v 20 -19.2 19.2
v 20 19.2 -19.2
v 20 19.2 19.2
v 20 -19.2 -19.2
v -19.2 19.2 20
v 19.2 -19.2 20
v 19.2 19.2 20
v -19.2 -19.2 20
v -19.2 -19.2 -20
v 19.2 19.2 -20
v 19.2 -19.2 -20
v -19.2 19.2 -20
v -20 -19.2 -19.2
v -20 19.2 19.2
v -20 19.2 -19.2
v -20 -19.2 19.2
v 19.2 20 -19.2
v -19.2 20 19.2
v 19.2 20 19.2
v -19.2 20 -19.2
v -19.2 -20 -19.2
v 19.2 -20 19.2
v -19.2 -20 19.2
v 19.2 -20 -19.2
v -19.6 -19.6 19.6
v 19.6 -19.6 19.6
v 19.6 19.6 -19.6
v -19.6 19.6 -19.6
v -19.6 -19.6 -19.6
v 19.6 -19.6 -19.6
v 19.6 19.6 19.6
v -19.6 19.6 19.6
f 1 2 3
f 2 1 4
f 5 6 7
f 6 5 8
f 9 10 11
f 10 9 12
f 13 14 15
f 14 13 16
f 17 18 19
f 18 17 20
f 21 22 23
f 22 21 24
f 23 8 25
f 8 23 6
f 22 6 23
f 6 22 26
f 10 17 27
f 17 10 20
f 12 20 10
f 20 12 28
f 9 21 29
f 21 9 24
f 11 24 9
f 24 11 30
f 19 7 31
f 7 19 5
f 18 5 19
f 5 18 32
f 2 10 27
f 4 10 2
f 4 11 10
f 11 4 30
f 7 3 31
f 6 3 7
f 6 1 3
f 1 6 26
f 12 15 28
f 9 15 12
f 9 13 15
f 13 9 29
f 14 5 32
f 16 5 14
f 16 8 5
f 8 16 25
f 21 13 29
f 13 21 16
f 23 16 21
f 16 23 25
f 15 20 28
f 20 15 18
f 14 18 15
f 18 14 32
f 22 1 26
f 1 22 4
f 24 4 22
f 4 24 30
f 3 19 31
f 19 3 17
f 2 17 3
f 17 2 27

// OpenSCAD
// file: tag_bits.scad
// Generated by generate.py. Do not edit by hand; rerun the generator instead.
TAG_FAMILY = "tag36h11";
CUBE_INDEX = 0;
GENERATED_EDGE = 40.0;
GENERATED_CELL = 4.0;
// [id, normal, right, up, bits(row 0 = top)]
TAGS = [
  [0, [0.0, 0.0, 1.0], [1.0, 0.0, 0.0], [0.0, 1.0, 0.0],
     [[1, 1, 1, 1, 1, 1, 1, 1],
      [1, 1, 1, 0, 1, 1, 1, 1],
      [1, 1, 0, 0, 1, 0, 1, 1],
      [1, 1, 1, 1, 0, 1, 0, 1],
      [1, 1, 1, 1, 0, 0, 1, 1],
      [1, 0, 1, 0, 0, 0, 1, 1],
      [1, 0, 1, 0, 1, 0, 0, 1],
      [1, 1, 1, 1, 1, 1, 1, 1]]],
  [1, [1.0, 0.0, 0.0], [0.0, 1.0, 0.0], [0.0, 0.0, 1.0],
     [[1, 1, 1, 1, 1, 1, 1, 1],
      [1, 0, 1, 1, 0, 1, 1, 1],
      [1, 0, 1, 0, 0, 1, 0, 1],
      [1, 1, 1, 1, 0, 0, 1, 1],
      [1, 1, 1, 0, 0, 0, 0, 1],
      [1, 0, 0, 0, 1, 0, 1, 1],
      [1, 1, 0, 0, 1, 0, 0, 1],
      [1, 1, 1, 1, 1, 1, 1, 1]]],
  [2, [0.0, 1.0, 0.0], [-1.0, 0.0, 0.0], [0.0, 0.0, 1.0],
     [[1, 1, 1, 1, 1, 1, 1, 1],
      [1, 1, 0, 0, 0, 1, 1, 1],
      [1, 1, 1, 0, 1, 1, 1, 1],
      [1, 0, 1, 1, 0, 1, 1, 1],
      [1, 1, 1, 1, 1, 1, 0, 1],
      [1, 1, 0, 1, 1, 0, 1, 1],
      [1, 0, 0, 0, 1, 0, 0, 1],
      [1, 1, 1, 1, 1, 1, 1, 1]]],
  [3, [-1.0, 0.0, 0.0], [0.0, -1.0, 0.0], [0.0, 0.0, 1.0],
     [[1, 1, 1, 1, 1, 1, 1, 1],
      [1, 1, 1, 1, 0, 0, 1, 1],
      [1, 1, 0, 1, 1, 0, 0, 1],
      [1, 0, 1, 1, 0, 1, 0, 1],
      [1, 0, 0, 0, 1, 1, 0, 1],
      [1, 0, 0, 0, 1, 1, 1, 1],
      [1, 0, 1, 1, 0, 0, 0, 1],
      [1, 1, 1, 1, 1, 1, 1, 1]]],
  [4, [0.0, -1.0, 0.0], [1.0, 0.0, 0.0], [0.0, 0.0, 1.0],
     [[1, 1, 1, 1, 1, 1, 1, 1],
      [1, 1, 0, 1, 1, 1, 0, 1],
      [1, 1, 1, 1, 1, 1, 0, 1],
      [1, 1, 0, 1, 0, 1, 1, 1],
      [1, 0, 0, 0, 0, 1, 0, 1],
      [1, 1, 1, 0, 0, 0, 0, 1],
      [1, 1, 0, 1, 0, 0, 0, 1],
      [1, 1, 1, 1, 1, 1, 1, 1]]],
];
// The sixth tag, printed instead of the handle socket (calibration_cube.scad bottom = "tag").
BOTTOM_TAG = [500, [0.0, 0.0, -1.0], [1.0, 0.0, 0.0], [0.0, -1.0, 0.0],
     [[1, 1, 1, 1, 1, 1, 1, 1],
      [1, 1, 0, 0, 0, 1, 0, 1],
      [1, 1, 0, 0, 1, 1, 1, 1],
      [1, 0, 0, 1, 1, 1, 1, 1],
      [1, 0, 0, 1, 0, 1, 1, 1],
      [1, 0, 0, 1, 0, 0, 1, 1],
      [1, 0, 1, 0, 1, 0, 0, 1],
      [1, 1, 1, 1, 1, 1, 1, 1]]];
// main file
// TerraMesh intertidal calibration cube
//
// A 40 mm cube with an AprilTag (tag36h11) on every face, or on five faces with a
// handle socket or an anchor (ballast and cord loop) in the sixth (set `bottom`). Placed at the mouth of a crevice, it gives the phone video a known
// metric scale, a fixed origin, and a live check that the camera is close and
// sharp enough. Tag geometry comes from tag_bits.scad, which generate.py writes
// alongside cube-spec.json so the printed cube and the scale solver always agree.
//
// Parts (set `part`, or pass -D 'part="ink"' on the command line):
//   "body"    white body with the black cells recessed as pockets
//   "ink"     the black cells only, to drop into the pockets on a
//             multi-material printer (export both, assign black to "ink")
//   "preview" both together, coloured
//
// Single-extruder printers: print "body" in white and fill the pockets with black
// paint pen or epoxy, or print a plain cube and apply stickers.svg on vinyl.
// Whatever the method, measure the finished tag edge with calipers and enter it
// in the app (it overrides cell_mm * 8 in the scale solve).

include <tag_bits.scad>

part = "preview";        // [body, ink, preview]
bottom = "tag";          // [tag, socket, anchor]: a sixth tag, the 1/4 in dowel socket for a pole,
                         // or the anchor: a sealed ballast pocket and a cord loop, for surge
edge = GENERATED_EDGE;   // cube edge, mm (must match the generator)
cell = GENERATED_CELL;   // tag cell, mm (must match the generator)
inlay_depth = 0.8;       // pocket / ink depth, mm (2 layers at 0.4 or 4 at 0.2)
chamfer = 0.8;           // edge chamfer, stays inside the white quiet zone
socket_d = 6.6;          // fits a 1/4 in (6.35 mm) dowel or a trekking-pole tip adapter
socket_depth = 18;
// Anchor. The pocket is filled with steel shot at a print pause, when the print reaches the
// top of its straight wall (ballast_pause_z, from the plate), before the cone roof closes it.
// Its roof is a 45 degree cone, so nothing inside needs support.
ballast_d = 26;
ballast_floor = 8.5;     // solid under the pocket, holds the cord tunnel
ballast_h = 14.5;        // straight wall; the shot must sit below this
cord_d = 3.4;            // 2-3 mm cord
cord_x = 9;              // the two cord holes, either side of the centre
cord_z = 4.2;            // tunnel centre above the bottom face
ballast_pause_z = ballast_floor + ballast_h;
eps = 0.01;

tag = 8 * cell;
assert(tag + 2 * chamfer < edge, "tag plus chamfer does not fit on the face");

// Local face frame: x along the tag's right edge, y along its up edge, z out.
module on_face(t) {
    n = t[1]; u = t[2]; w = t[3];
    c = n * edge / 2;
    multmatrix([[u[0], w[0], n[0], c[0]],
                [u[1], w[1], n[1], c[1]],
                [u[2], w[2], n[2], c[2]],
                [0, 0, 0, 1]]) children();
}

// `grow` keeps diagonal neighbours overlapping so the result stays manifold;
// `lift` extends a cutter past the surface so pockets open cleanly.
module black_cells(t, grow = 0.005, lift = 0) {
    bits = t[4];
    for (r = [0 : 7], c = [0 : 7]) if (bits[r][c] == 1)
        translate([-tag / 2 + c * cell - grow, tag / 2 - (r + 1) * cell - grow, -inlay_depth])
            cube([cell + 2 * grow, cell + 2 * grow, inlay_depth + lift]);
}

module chamfered_cube() {
    // Intersection of the cube with a cube rotated to cut each edge and corner.
    intersection() {
        cube(edge, center = true);
        rotate([45, 0, 0]) cube([edge, edge * sqrt(2) - chamfer * sqrt(2), edge * sqrt(2) - chamfer * sqrt(2)], center = true);
        rotate([0, 45, 0]) cube([edge * sqrt(2) - chamfer * sqrt(2), edge, edge * sqrt(2) - chamfer * sqrt(2)], center = true);
        rotate([0, 0, 45]) cube([edge * sqrt(2) - chamfer * sqrt(2), edge * sqrt(2) - chamfer * sqrt(2), edge], center = true);
    }
}

module anchor() {
    z0 = -edge / 2;
    // sealed ballast pocket with a self-supporting cone roof
    translate([0, 0, z0 + ballast_floor]) {
        cylinder(d = ballast_d, h = ballast_h, $fn = 64);
        translate([0, 0, ballast_h]) cylinder(d1 = ballast_d, d2 = 0.1, h = ballast_d / 2, $fn = 64);
    }
    // cord loop: two holes up from the bottom face, joined by a tunnel with a pointed
    // (teardrop) roof that prints without support
    for (x = [-cord_x, cord_x]) {
        translate([x, 0, z0 - eps]) cylinder(d = cord_d, h = cord_z + eps, $fn = 24);
        translate([x, 0, z0 - eps]) cylinder(d1 = cord_d + 2, d2 = cord_d, h = 1, $fn = 24);  // eased mouth
    }
    r = cord_d / 2;
    translate([-cord_x, 0, z0 + cord_z]) rotate([0, 90, 0]) {  // local -x is world up
        cylinder(r = r, h = 2 * cord_x, $fn = 24);
        linear_extrude(2 * cord_x) polygon([[-r * sqrt(2), 0], [-r / sqrt(2), r / sqrt(2)], [-r / sqrt(2), -r / sqrt(2)]]);
    }
    for (x = [-cord_x, cord_x]) translate([x, 0, z0 + cord_z]) sphere(d = cord_d, $fn = 24);
}

module body() {
    difference() {
        chamfered_cube();
        for (t = TAGS) on_face(t) black_cells(t, lift = 1);
        if (bottom == "tag") {
            on_face(BOTTOM_TAG) black_cells(BOTTOM_TAG, lift = 1);
        } else {
            if (bottom == "anchor") anchor();
            // handle socket in the untagged bottom face
            else translate([0, 0, -edge / 2 - eps]) cylinder(d = socket_d, h = socket_depth, $fn = 48);
            // bottom-face scale ticks every 5 mm, a manual check of print scale
            for (i = [-3 : 3]) translate([i * 5 - 0.3, edge / 2 - 7, -edge / 2 - eps])
                cube([0.6, (i % 2 == 0) ? 4 : 2.5, 0.6]);
        }
    }
}

module ink() {
    for (t = TAGS) on_face(t) black_cells(t);
    if (bottom == "tag") on_face(BOTTOM_TAG) black_cells(BOTTOM_TAG);
}

if (part == "body") body();
else if (part == "ink") ink();
else { color("white") body(); color("black") ink(); }
